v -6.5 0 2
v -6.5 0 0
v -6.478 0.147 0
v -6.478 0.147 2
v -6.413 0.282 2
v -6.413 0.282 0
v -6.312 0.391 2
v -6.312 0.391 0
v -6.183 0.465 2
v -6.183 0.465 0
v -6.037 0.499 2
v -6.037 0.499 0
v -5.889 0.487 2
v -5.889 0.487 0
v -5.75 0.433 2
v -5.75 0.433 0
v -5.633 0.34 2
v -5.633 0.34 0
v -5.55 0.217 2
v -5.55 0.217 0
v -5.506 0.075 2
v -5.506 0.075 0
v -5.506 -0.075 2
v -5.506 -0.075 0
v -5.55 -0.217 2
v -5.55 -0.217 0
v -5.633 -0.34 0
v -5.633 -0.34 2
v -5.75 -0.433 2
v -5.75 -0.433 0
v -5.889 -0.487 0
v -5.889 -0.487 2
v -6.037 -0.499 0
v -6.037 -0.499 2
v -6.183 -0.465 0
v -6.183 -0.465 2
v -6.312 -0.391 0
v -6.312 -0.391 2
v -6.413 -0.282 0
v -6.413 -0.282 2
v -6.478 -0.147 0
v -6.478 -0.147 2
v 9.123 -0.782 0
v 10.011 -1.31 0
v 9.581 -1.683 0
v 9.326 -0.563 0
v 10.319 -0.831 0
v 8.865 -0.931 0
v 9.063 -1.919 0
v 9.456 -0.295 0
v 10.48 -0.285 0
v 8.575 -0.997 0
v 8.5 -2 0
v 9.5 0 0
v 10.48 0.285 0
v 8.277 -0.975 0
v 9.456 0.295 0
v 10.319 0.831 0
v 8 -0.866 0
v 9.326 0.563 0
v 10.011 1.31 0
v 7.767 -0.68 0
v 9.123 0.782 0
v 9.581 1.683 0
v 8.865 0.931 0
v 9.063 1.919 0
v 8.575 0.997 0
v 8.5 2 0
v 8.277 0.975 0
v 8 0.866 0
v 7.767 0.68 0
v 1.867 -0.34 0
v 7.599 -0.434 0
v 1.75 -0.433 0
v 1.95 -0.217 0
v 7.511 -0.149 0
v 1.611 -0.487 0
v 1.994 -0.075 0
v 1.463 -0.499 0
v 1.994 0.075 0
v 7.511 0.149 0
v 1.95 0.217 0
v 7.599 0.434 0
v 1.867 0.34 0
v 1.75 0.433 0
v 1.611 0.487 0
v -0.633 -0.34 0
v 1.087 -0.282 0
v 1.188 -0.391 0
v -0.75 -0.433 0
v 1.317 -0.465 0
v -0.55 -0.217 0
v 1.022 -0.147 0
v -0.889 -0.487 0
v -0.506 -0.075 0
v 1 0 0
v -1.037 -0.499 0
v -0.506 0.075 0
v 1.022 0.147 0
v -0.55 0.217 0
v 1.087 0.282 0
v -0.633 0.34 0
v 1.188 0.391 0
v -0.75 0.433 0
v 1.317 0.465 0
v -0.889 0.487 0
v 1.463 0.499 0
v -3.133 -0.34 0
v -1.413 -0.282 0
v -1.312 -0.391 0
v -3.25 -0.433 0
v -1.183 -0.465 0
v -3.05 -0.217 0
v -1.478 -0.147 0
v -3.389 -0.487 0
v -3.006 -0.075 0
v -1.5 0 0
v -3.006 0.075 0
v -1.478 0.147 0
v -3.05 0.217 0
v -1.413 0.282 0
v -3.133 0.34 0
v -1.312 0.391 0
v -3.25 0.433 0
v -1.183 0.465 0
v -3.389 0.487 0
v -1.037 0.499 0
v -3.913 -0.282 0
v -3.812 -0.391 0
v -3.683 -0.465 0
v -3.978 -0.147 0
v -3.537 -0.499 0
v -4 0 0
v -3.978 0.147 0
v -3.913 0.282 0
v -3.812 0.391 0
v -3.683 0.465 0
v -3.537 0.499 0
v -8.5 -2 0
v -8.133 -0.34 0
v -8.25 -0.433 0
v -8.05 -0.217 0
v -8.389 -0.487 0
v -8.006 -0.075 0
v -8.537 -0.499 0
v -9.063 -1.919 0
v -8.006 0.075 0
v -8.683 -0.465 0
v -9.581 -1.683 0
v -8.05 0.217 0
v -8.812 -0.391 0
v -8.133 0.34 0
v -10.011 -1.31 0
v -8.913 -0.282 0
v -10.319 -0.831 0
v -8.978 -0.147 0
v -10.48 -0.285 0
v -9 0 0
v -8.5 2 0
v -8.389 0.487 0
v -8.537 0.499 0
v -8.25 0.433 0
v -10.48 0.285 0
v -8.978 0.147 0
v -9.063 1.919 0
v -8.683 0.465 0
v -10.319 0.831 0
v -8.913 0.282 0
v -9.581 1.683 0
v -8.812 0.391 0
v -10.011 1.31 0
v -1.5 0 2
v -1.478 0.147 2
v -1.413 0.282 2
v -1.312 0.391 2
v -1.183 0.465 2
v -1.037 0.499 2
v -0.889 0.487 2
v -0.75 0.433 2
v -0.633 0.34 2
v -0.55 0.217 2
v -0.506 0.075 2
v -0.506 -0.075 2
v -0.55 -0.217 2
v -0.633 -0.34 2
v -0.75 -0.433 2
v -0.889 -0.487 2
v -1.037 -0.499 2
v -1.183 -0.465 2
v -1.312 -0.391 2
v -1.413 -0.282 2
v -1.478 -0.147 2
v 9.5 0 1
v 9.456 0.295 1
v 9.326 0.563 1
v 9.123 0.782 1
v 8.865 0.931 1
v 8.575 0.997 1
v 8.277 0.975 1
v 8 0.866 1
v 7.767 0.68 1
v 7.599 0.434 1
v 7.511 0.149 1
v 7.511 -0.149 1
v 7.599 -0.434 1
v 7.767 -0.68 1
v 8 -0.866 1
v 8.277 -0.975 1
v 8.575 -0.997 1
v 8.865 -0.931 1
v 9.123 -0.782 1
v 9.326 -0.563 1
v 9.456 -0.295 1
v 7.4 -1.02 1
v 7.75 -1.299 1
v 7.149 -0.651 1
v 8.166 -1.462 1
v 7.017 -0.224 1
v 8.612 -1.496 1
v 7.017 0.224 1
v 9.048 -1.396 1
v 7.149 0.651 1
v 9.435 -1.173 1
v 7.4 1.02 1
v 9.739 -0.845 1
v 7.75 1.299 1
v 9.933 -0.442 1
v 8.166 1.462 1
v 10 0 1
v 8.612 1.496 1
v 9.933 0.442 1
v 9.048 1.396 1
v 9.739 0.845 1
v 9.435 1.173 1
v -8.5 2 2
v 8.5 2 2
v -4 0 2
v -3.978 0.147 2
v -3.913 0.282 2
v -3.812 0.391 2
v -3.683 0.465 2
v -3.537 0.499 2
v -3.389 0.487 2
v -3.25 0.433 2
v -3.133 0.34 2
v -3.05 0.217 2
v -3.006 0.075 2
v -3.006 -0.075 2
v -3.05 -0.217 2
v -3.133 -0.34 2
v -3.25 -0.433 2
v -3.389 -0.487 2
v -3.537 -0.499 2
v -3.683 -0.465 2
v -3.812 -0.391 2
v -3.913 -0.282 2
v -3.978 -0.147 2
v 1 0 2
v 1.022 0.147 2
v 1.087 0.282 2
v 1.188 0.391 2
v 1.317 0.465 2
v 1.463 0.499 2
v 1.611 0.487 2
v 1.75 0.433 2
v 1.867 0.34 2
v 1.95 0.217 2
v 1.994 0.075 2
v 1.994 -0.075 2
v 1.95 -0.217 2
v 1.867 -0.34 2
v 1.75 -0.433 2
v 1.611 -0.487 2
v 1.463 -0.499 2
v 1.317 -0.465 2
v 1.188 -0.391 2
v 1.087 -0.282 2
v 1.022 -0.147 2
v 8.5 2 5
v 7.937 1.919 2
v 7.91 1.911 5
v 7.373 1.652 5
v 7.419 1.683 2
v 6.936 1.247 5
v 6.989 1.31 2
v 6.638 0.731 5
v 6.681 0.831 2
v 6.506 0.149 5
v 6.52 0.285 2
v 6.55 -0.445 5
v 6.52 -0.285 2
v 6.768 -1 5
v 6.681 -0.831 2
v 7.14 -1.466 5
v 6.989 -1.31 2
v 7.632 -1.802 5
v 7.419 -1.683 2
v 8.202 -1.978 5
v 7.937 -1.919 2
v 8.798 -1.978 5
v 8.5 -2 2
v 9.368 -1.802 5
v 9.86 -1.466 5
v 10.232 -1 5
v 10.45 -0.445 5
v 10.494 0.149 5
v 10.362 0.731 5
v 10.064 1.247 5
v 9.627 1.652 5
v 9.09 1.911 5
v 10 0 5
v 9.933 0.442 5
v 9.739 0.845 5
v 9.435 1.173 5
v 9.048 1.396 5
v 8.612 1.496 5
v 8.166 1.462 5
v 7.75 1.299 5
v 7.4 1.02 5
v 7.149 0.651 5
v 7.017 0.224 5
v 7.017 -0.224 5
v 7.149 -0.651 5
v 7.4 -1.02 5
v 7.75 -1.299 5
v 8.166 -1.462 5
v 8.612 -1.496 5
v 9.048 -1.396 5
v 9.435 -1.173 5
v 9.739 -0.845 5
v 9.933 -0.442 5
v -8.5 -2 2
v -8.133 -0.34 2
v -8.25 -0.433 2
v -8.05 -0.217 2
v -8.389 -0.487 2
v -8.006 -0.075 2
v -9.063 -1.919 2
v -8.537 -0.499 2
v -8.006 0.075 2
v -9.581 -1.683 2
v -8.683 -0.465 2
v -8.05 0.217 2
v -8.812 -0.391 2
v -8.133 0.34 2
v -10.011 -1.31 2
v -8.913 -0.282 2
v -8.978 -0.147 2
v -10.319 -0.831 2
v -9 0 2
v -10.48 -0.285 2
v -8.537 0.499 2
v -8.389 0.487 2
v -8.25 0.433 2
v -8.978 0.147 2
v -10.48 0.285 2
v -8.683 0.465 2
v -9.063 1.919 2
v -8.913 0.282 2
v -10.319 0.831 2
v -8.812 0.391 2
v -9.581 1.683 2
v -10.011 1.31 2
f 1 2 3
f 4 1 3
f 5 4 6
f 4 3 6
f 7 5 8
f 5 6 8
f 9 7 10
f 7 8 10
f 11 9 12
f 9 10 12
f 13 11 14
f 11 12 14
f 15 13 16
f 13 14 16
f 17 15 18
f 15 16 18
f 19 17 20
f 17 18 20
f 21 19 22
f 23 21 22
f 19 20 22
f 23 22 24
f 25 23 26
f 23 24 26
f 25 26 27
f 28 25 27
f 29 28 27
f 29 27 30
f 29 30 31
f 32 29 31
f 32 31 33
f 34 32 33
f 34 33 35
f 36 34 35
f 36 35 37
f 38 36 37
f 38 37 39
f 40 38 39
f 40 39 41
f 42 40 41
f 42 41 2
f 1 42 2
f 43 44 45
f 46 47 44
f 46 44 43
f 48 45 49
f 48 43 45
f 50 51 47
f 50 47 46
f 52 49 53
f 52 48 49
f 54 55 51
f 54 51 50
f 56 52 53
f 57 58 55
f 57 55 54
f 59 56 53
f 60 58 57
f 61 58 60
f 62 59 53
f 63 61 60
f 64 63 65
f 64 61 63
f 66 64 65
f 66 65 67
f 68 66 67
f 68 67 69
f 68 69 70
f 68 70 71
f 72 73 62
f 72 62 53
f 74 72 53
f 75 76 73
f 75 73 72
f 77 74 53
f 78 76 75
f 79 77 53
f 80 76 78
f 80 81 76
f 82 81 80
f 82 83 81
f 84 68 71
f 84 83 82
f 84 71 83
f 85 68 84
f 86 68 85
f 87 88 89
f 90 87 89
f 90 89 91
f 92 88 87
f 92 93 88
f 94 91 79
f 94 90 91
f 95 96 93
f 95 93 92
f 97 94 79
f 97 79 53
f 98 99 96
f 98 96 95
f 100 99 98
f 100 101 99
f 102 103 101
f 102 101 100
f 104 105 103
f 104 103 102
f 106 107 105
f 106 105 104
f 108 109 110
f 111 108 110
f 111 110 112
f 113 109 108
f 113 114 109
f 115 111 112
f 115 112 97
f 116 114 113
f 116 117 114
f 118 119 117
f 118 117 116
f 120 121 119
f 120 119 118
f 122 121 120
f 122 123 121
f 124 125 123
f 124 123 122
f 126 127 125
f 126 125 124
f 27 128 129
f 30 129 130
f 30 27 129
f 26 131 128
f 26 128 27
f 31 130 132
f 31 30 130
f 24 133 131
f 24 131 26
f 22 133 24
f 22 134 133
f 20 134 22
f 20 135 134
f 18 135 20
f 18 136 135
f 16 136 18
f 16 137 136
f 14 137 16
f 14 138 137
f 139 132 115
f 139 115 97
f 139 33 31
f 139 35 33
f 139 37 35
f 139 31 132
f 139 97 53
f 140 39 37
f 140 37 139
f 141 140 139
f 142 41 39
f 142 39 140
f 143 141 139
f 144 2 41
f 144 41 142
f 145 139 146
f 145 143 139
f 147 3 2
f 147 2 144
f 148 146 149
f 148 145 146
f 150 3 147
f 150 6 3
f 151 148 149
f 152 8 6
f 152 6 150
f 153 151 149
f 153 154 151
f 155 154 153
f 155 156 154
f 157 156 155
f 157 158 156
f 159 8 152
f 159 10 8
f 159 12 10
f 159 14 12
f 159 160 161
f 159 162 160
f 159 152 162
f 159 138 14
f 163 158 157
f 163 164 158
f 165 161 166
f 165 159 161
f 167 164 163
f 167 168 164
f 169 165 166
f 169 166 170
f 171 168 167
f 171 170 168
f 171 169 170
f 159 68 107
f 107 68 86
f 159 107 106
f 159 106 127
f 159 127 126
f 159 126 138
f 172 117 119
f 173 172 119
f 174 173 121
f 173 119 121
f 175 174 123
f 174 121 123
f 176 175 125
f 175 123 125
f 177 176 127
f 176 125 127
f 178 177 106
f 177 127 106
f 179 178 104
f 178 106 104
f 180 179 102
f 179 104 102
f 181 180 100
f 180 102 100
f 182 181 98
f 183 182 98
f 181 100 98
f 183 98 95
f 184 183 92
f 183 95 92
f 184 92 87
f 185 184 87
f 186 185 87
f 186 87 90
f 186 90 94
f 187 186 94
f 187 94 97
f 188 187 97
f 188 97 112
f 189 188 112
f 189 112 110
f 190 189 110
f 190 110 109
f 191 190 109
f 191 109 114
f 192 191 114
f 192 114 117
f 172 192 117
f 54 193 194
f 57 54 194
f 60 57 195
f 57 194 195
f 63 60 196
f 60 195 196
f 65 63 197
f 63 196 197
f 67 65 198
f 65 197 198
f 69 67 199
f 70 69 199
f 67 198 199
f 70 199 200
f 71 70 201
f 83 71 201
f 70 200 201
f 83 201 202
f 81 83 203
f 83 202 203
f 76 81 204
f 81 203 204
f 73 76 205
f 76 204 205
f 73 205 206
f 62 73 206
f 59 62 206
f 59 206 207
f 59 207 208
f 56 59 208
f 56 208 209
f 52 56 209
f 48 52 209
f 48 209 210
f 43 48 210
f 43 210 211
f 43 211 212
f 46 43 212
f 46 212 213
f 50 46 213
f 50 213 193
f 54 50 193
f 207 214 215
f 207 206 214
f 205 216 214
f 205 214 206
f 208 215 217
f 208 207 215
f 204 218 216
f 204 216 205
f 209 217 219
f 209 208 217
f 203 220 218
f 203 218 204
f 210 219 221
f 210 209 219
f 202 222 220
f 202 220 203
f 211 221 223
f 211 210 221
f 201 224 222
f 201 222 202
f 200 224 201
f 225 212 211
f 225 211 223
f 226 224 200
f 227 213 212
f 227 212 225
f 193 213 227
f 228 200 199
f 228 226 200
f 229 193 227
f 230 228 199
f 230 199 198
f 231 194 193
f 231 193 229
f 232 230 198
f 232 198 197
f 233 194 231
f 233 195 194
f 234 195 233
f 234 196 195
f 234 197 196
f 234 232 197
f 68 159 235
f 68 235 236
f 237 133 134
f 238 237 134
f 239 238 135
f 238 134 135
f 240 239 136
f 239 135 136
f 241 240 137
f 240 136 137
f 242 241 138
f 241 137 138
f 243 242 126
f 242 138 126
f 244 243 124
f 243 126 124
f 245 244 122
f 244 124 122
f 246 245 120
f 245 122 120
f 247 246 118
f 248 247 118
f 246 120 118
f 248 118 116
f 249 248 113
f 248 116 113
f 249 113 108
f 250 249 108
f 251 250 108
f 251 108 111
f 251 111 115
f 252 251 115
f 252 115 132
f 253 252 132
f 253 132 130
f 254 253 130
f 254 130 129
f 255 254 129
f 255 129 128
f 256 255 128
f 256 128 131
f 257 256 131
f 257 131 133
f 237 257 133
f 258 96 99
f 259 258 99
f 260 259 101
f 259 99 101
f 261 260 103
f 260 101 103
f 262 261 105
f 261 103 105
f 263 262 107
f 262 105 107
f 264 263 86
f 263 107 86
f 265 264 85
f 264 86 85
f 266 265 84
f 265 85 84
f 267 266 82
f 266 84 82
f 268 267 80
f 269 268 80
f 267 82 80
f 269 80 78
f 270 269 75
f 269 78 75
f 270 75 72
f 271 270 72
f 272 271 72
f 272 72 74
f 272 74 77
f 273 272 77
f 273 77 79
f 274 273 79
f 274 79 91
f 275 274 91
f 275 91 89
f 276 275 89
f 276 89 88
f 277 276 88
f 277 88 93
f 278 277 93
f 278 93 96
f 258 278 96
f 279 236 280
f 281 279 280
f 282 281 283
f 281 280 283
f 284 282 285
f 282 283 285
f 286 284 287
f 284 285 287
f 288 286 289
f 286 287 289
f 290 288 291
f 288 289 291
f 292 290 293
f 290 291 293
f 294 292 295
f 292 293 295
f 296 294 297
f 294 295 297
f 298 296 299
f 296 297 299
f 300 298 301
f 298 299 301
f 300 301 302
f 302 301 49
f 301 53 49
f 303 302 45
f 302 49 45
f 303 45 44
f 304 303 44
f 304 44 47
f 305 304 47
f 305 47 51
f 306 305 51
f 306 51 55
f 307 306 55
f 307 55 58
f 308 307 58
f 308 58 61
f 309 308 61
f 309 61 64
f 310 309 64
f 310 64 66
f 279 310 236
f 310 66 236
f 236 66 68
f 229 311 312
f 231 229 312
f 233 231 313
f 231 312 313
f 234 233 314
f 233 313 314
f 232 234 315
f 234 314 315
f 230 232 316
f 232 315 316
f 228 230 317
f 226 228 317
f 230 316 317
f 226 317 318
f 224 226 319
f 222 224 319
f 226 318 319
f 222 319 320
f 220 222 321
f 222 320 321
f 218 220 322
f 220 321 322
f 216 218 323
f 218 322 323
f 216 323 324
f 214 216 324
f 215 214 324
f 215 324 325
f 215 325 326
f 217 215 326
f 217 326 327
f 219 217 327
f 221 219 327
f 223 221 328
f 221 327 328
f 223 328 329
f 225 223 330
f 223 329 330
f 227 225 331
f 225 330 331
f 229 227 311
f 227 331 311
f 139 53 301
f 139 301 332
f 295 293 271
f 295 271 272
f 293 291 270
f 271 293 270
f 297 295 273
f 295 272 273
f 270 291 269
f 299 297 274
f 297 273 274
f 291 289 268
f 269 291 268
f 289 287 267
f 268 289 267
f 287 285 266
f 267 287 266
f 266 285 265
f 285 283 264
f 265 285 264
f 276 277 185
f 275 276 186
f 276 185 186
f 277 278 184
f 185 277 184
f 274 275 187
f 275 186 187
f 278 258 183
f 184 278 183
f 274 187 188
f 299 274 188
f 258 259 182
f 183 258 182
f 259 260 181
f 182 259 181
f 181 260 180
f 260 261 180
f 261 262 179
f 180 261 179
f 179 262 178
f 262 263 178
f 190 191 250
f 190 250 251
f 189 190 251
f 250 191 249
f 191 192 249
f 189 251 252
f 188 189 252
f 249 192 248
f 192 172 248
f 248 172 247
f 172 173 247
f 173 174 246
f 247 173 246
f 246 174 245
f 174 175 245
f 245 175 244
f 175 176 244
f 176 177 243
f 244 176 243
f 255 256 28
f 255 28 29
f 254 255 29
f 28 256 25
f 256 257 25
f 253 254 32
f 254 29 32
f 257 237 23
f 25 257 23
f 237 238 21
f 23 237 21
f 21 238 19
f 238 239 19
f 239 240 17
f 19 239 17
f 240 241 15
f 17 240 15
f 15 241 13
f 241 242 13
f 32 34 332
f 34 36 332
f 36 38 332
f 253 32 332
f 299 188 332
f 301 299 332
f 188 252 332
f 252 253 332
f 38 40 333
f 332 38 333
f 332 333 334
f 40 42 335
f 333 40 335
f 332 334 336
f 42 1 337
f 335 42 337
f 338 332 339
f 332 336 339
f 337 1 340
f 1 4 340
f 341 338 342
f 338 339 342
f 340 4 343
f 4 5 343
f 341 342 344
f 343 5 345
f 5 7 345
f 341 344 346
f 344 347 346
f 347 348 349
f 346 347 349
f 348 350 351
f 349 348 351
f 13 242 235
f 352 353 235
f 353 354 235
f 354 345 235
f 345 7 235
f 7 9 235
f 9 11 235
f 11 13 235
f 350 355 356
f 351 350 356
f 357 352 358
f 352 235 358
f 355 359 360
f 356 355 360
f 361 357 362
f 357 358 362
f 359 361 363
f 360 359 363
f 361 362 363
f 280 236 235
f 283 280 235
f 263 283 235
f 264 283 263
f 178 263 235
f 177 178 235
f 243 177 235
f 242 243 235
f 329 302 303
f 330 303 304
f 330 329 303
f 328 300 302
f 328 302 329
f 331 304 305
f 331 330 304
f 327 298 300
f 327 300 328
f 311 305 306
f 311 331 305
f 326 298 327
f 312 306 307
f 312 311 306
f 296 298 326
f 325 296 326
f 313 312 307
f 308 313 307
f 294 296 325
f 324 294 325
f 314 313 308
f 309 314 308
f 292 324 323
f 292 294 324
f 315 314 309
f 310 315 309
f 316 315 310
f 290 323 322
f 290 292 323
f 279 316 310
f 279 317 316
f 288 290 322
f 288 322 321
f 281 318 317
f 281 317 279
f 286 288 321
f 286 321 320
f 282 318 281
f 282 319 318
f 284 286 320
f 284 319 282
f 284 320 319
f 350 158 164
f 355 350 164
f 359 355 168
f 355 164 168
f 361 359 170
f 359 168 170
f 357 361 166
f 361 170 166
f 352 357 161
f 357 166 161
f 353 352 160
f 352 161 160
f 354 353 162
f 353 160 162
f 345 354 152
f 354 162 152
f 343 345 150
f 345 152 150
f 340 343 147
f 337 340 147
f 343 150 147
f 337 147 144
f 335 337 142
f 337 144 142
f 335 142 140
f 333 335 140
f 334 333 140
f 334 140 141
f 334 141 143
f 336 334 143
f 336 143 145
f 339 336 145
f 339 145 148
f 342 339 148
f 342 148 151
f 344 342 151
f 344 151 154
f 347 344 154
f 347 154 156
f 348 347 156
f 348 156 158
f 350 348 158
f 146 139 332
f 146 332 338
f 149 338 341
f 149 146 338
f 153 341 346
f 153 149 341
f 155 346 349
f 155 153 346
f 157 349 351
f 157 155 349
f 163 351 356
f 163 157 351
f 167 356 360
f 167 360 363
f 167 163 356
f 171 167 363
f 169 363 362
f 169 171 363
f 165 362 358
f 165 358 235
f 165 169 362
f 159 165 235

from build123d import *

# Parameters (mm, degrees)
EXTRUDE_1_DEPTH     = 2
SKETCH_3_R          = 2
EXTRUDE_2_DEPTH     = 3
SKETCH_4_R          = 1.5
CUT_EXTRUDE_1_DEPTH = 4
SKETCH_5_R          = 1
CUT_EXTRUDE_2_DEPTH = 4
SKETCH_6_R          = 0.5
CUT_EXTRUDE_3_DEPTH = 10


with BuildPart() as part:
    # 草图2 → 凸台-拉伸1 (new body)
    with BuildSketch(Plane.XY):
        with BuildLine():
            Line((-8.5, 2), (8.5, 2))
            ThreePointArc((8.5, 2), (10.5, 0), (8.5, -2))
            Line((8.5, -2), (-8.5, -2))
            ThreePointArc((-8.5, -2), (-10.5, 0), (-8.5, 2))
        make_face()
    extrude(amount=EXTRUDE_1_DEPTH)

    # 草图3 → 凸台-拉伸2 (add)
    with BuildSketch(Plane.XY.offset(2)):
        with Locations(Location((8.5, 0, 0), (0, 0, 90))):
            Circle(SKETCH_3_R)
    extrude(amount=EXTRUDE_2_DEPTH)

    # 草图4 → 切除-拉伸1 (cut)
    with BuildSketch(Plane.XY.offset(5)):
        with Locations((8.5, 0)):
            Circle(SKETCH_4_R)
    extrude(amount=-CUT_EXTRUDE_1_DEPTH, mode=Mode.SUBTRACT)

    # 草图5 → 切除-拉伸2 (cut)
    with BuildSketch(Plane.XY.offset(1)):
        with Locations((8.5, 0)):
            Circle(SKETCH_5_R)
    extrude(amount=-CUT_EXTRUDE_2_DEPTH, mode=Mode.SUBTRACT)

    # 草图6 → 切除-拉伸3 (cut)
    with BuildSketch(Plane(origin=(0, 0, 0), x_dir=(-1, 0, 0), z_dir=(0, 0, -1))):
        with Locations((-1.5, 0)):
            Circle(SKETCH_6_R)
        with Locations((1, 0)):
            Circle(SKETCH_6_R)
        with Locations((3.5, 0)):
            Circle(SKETCH_6_R)
        with Locations((6, 0)):
            Circle(SKETCH_6_R)
        with Locations((8.5, 0)):
            Circle(SKETCH_6_R)
    extrude(amount=-CUT_EXTRUDE_3_DEPTH, mode=Mode.SUBTRACT)


solid = part.part
